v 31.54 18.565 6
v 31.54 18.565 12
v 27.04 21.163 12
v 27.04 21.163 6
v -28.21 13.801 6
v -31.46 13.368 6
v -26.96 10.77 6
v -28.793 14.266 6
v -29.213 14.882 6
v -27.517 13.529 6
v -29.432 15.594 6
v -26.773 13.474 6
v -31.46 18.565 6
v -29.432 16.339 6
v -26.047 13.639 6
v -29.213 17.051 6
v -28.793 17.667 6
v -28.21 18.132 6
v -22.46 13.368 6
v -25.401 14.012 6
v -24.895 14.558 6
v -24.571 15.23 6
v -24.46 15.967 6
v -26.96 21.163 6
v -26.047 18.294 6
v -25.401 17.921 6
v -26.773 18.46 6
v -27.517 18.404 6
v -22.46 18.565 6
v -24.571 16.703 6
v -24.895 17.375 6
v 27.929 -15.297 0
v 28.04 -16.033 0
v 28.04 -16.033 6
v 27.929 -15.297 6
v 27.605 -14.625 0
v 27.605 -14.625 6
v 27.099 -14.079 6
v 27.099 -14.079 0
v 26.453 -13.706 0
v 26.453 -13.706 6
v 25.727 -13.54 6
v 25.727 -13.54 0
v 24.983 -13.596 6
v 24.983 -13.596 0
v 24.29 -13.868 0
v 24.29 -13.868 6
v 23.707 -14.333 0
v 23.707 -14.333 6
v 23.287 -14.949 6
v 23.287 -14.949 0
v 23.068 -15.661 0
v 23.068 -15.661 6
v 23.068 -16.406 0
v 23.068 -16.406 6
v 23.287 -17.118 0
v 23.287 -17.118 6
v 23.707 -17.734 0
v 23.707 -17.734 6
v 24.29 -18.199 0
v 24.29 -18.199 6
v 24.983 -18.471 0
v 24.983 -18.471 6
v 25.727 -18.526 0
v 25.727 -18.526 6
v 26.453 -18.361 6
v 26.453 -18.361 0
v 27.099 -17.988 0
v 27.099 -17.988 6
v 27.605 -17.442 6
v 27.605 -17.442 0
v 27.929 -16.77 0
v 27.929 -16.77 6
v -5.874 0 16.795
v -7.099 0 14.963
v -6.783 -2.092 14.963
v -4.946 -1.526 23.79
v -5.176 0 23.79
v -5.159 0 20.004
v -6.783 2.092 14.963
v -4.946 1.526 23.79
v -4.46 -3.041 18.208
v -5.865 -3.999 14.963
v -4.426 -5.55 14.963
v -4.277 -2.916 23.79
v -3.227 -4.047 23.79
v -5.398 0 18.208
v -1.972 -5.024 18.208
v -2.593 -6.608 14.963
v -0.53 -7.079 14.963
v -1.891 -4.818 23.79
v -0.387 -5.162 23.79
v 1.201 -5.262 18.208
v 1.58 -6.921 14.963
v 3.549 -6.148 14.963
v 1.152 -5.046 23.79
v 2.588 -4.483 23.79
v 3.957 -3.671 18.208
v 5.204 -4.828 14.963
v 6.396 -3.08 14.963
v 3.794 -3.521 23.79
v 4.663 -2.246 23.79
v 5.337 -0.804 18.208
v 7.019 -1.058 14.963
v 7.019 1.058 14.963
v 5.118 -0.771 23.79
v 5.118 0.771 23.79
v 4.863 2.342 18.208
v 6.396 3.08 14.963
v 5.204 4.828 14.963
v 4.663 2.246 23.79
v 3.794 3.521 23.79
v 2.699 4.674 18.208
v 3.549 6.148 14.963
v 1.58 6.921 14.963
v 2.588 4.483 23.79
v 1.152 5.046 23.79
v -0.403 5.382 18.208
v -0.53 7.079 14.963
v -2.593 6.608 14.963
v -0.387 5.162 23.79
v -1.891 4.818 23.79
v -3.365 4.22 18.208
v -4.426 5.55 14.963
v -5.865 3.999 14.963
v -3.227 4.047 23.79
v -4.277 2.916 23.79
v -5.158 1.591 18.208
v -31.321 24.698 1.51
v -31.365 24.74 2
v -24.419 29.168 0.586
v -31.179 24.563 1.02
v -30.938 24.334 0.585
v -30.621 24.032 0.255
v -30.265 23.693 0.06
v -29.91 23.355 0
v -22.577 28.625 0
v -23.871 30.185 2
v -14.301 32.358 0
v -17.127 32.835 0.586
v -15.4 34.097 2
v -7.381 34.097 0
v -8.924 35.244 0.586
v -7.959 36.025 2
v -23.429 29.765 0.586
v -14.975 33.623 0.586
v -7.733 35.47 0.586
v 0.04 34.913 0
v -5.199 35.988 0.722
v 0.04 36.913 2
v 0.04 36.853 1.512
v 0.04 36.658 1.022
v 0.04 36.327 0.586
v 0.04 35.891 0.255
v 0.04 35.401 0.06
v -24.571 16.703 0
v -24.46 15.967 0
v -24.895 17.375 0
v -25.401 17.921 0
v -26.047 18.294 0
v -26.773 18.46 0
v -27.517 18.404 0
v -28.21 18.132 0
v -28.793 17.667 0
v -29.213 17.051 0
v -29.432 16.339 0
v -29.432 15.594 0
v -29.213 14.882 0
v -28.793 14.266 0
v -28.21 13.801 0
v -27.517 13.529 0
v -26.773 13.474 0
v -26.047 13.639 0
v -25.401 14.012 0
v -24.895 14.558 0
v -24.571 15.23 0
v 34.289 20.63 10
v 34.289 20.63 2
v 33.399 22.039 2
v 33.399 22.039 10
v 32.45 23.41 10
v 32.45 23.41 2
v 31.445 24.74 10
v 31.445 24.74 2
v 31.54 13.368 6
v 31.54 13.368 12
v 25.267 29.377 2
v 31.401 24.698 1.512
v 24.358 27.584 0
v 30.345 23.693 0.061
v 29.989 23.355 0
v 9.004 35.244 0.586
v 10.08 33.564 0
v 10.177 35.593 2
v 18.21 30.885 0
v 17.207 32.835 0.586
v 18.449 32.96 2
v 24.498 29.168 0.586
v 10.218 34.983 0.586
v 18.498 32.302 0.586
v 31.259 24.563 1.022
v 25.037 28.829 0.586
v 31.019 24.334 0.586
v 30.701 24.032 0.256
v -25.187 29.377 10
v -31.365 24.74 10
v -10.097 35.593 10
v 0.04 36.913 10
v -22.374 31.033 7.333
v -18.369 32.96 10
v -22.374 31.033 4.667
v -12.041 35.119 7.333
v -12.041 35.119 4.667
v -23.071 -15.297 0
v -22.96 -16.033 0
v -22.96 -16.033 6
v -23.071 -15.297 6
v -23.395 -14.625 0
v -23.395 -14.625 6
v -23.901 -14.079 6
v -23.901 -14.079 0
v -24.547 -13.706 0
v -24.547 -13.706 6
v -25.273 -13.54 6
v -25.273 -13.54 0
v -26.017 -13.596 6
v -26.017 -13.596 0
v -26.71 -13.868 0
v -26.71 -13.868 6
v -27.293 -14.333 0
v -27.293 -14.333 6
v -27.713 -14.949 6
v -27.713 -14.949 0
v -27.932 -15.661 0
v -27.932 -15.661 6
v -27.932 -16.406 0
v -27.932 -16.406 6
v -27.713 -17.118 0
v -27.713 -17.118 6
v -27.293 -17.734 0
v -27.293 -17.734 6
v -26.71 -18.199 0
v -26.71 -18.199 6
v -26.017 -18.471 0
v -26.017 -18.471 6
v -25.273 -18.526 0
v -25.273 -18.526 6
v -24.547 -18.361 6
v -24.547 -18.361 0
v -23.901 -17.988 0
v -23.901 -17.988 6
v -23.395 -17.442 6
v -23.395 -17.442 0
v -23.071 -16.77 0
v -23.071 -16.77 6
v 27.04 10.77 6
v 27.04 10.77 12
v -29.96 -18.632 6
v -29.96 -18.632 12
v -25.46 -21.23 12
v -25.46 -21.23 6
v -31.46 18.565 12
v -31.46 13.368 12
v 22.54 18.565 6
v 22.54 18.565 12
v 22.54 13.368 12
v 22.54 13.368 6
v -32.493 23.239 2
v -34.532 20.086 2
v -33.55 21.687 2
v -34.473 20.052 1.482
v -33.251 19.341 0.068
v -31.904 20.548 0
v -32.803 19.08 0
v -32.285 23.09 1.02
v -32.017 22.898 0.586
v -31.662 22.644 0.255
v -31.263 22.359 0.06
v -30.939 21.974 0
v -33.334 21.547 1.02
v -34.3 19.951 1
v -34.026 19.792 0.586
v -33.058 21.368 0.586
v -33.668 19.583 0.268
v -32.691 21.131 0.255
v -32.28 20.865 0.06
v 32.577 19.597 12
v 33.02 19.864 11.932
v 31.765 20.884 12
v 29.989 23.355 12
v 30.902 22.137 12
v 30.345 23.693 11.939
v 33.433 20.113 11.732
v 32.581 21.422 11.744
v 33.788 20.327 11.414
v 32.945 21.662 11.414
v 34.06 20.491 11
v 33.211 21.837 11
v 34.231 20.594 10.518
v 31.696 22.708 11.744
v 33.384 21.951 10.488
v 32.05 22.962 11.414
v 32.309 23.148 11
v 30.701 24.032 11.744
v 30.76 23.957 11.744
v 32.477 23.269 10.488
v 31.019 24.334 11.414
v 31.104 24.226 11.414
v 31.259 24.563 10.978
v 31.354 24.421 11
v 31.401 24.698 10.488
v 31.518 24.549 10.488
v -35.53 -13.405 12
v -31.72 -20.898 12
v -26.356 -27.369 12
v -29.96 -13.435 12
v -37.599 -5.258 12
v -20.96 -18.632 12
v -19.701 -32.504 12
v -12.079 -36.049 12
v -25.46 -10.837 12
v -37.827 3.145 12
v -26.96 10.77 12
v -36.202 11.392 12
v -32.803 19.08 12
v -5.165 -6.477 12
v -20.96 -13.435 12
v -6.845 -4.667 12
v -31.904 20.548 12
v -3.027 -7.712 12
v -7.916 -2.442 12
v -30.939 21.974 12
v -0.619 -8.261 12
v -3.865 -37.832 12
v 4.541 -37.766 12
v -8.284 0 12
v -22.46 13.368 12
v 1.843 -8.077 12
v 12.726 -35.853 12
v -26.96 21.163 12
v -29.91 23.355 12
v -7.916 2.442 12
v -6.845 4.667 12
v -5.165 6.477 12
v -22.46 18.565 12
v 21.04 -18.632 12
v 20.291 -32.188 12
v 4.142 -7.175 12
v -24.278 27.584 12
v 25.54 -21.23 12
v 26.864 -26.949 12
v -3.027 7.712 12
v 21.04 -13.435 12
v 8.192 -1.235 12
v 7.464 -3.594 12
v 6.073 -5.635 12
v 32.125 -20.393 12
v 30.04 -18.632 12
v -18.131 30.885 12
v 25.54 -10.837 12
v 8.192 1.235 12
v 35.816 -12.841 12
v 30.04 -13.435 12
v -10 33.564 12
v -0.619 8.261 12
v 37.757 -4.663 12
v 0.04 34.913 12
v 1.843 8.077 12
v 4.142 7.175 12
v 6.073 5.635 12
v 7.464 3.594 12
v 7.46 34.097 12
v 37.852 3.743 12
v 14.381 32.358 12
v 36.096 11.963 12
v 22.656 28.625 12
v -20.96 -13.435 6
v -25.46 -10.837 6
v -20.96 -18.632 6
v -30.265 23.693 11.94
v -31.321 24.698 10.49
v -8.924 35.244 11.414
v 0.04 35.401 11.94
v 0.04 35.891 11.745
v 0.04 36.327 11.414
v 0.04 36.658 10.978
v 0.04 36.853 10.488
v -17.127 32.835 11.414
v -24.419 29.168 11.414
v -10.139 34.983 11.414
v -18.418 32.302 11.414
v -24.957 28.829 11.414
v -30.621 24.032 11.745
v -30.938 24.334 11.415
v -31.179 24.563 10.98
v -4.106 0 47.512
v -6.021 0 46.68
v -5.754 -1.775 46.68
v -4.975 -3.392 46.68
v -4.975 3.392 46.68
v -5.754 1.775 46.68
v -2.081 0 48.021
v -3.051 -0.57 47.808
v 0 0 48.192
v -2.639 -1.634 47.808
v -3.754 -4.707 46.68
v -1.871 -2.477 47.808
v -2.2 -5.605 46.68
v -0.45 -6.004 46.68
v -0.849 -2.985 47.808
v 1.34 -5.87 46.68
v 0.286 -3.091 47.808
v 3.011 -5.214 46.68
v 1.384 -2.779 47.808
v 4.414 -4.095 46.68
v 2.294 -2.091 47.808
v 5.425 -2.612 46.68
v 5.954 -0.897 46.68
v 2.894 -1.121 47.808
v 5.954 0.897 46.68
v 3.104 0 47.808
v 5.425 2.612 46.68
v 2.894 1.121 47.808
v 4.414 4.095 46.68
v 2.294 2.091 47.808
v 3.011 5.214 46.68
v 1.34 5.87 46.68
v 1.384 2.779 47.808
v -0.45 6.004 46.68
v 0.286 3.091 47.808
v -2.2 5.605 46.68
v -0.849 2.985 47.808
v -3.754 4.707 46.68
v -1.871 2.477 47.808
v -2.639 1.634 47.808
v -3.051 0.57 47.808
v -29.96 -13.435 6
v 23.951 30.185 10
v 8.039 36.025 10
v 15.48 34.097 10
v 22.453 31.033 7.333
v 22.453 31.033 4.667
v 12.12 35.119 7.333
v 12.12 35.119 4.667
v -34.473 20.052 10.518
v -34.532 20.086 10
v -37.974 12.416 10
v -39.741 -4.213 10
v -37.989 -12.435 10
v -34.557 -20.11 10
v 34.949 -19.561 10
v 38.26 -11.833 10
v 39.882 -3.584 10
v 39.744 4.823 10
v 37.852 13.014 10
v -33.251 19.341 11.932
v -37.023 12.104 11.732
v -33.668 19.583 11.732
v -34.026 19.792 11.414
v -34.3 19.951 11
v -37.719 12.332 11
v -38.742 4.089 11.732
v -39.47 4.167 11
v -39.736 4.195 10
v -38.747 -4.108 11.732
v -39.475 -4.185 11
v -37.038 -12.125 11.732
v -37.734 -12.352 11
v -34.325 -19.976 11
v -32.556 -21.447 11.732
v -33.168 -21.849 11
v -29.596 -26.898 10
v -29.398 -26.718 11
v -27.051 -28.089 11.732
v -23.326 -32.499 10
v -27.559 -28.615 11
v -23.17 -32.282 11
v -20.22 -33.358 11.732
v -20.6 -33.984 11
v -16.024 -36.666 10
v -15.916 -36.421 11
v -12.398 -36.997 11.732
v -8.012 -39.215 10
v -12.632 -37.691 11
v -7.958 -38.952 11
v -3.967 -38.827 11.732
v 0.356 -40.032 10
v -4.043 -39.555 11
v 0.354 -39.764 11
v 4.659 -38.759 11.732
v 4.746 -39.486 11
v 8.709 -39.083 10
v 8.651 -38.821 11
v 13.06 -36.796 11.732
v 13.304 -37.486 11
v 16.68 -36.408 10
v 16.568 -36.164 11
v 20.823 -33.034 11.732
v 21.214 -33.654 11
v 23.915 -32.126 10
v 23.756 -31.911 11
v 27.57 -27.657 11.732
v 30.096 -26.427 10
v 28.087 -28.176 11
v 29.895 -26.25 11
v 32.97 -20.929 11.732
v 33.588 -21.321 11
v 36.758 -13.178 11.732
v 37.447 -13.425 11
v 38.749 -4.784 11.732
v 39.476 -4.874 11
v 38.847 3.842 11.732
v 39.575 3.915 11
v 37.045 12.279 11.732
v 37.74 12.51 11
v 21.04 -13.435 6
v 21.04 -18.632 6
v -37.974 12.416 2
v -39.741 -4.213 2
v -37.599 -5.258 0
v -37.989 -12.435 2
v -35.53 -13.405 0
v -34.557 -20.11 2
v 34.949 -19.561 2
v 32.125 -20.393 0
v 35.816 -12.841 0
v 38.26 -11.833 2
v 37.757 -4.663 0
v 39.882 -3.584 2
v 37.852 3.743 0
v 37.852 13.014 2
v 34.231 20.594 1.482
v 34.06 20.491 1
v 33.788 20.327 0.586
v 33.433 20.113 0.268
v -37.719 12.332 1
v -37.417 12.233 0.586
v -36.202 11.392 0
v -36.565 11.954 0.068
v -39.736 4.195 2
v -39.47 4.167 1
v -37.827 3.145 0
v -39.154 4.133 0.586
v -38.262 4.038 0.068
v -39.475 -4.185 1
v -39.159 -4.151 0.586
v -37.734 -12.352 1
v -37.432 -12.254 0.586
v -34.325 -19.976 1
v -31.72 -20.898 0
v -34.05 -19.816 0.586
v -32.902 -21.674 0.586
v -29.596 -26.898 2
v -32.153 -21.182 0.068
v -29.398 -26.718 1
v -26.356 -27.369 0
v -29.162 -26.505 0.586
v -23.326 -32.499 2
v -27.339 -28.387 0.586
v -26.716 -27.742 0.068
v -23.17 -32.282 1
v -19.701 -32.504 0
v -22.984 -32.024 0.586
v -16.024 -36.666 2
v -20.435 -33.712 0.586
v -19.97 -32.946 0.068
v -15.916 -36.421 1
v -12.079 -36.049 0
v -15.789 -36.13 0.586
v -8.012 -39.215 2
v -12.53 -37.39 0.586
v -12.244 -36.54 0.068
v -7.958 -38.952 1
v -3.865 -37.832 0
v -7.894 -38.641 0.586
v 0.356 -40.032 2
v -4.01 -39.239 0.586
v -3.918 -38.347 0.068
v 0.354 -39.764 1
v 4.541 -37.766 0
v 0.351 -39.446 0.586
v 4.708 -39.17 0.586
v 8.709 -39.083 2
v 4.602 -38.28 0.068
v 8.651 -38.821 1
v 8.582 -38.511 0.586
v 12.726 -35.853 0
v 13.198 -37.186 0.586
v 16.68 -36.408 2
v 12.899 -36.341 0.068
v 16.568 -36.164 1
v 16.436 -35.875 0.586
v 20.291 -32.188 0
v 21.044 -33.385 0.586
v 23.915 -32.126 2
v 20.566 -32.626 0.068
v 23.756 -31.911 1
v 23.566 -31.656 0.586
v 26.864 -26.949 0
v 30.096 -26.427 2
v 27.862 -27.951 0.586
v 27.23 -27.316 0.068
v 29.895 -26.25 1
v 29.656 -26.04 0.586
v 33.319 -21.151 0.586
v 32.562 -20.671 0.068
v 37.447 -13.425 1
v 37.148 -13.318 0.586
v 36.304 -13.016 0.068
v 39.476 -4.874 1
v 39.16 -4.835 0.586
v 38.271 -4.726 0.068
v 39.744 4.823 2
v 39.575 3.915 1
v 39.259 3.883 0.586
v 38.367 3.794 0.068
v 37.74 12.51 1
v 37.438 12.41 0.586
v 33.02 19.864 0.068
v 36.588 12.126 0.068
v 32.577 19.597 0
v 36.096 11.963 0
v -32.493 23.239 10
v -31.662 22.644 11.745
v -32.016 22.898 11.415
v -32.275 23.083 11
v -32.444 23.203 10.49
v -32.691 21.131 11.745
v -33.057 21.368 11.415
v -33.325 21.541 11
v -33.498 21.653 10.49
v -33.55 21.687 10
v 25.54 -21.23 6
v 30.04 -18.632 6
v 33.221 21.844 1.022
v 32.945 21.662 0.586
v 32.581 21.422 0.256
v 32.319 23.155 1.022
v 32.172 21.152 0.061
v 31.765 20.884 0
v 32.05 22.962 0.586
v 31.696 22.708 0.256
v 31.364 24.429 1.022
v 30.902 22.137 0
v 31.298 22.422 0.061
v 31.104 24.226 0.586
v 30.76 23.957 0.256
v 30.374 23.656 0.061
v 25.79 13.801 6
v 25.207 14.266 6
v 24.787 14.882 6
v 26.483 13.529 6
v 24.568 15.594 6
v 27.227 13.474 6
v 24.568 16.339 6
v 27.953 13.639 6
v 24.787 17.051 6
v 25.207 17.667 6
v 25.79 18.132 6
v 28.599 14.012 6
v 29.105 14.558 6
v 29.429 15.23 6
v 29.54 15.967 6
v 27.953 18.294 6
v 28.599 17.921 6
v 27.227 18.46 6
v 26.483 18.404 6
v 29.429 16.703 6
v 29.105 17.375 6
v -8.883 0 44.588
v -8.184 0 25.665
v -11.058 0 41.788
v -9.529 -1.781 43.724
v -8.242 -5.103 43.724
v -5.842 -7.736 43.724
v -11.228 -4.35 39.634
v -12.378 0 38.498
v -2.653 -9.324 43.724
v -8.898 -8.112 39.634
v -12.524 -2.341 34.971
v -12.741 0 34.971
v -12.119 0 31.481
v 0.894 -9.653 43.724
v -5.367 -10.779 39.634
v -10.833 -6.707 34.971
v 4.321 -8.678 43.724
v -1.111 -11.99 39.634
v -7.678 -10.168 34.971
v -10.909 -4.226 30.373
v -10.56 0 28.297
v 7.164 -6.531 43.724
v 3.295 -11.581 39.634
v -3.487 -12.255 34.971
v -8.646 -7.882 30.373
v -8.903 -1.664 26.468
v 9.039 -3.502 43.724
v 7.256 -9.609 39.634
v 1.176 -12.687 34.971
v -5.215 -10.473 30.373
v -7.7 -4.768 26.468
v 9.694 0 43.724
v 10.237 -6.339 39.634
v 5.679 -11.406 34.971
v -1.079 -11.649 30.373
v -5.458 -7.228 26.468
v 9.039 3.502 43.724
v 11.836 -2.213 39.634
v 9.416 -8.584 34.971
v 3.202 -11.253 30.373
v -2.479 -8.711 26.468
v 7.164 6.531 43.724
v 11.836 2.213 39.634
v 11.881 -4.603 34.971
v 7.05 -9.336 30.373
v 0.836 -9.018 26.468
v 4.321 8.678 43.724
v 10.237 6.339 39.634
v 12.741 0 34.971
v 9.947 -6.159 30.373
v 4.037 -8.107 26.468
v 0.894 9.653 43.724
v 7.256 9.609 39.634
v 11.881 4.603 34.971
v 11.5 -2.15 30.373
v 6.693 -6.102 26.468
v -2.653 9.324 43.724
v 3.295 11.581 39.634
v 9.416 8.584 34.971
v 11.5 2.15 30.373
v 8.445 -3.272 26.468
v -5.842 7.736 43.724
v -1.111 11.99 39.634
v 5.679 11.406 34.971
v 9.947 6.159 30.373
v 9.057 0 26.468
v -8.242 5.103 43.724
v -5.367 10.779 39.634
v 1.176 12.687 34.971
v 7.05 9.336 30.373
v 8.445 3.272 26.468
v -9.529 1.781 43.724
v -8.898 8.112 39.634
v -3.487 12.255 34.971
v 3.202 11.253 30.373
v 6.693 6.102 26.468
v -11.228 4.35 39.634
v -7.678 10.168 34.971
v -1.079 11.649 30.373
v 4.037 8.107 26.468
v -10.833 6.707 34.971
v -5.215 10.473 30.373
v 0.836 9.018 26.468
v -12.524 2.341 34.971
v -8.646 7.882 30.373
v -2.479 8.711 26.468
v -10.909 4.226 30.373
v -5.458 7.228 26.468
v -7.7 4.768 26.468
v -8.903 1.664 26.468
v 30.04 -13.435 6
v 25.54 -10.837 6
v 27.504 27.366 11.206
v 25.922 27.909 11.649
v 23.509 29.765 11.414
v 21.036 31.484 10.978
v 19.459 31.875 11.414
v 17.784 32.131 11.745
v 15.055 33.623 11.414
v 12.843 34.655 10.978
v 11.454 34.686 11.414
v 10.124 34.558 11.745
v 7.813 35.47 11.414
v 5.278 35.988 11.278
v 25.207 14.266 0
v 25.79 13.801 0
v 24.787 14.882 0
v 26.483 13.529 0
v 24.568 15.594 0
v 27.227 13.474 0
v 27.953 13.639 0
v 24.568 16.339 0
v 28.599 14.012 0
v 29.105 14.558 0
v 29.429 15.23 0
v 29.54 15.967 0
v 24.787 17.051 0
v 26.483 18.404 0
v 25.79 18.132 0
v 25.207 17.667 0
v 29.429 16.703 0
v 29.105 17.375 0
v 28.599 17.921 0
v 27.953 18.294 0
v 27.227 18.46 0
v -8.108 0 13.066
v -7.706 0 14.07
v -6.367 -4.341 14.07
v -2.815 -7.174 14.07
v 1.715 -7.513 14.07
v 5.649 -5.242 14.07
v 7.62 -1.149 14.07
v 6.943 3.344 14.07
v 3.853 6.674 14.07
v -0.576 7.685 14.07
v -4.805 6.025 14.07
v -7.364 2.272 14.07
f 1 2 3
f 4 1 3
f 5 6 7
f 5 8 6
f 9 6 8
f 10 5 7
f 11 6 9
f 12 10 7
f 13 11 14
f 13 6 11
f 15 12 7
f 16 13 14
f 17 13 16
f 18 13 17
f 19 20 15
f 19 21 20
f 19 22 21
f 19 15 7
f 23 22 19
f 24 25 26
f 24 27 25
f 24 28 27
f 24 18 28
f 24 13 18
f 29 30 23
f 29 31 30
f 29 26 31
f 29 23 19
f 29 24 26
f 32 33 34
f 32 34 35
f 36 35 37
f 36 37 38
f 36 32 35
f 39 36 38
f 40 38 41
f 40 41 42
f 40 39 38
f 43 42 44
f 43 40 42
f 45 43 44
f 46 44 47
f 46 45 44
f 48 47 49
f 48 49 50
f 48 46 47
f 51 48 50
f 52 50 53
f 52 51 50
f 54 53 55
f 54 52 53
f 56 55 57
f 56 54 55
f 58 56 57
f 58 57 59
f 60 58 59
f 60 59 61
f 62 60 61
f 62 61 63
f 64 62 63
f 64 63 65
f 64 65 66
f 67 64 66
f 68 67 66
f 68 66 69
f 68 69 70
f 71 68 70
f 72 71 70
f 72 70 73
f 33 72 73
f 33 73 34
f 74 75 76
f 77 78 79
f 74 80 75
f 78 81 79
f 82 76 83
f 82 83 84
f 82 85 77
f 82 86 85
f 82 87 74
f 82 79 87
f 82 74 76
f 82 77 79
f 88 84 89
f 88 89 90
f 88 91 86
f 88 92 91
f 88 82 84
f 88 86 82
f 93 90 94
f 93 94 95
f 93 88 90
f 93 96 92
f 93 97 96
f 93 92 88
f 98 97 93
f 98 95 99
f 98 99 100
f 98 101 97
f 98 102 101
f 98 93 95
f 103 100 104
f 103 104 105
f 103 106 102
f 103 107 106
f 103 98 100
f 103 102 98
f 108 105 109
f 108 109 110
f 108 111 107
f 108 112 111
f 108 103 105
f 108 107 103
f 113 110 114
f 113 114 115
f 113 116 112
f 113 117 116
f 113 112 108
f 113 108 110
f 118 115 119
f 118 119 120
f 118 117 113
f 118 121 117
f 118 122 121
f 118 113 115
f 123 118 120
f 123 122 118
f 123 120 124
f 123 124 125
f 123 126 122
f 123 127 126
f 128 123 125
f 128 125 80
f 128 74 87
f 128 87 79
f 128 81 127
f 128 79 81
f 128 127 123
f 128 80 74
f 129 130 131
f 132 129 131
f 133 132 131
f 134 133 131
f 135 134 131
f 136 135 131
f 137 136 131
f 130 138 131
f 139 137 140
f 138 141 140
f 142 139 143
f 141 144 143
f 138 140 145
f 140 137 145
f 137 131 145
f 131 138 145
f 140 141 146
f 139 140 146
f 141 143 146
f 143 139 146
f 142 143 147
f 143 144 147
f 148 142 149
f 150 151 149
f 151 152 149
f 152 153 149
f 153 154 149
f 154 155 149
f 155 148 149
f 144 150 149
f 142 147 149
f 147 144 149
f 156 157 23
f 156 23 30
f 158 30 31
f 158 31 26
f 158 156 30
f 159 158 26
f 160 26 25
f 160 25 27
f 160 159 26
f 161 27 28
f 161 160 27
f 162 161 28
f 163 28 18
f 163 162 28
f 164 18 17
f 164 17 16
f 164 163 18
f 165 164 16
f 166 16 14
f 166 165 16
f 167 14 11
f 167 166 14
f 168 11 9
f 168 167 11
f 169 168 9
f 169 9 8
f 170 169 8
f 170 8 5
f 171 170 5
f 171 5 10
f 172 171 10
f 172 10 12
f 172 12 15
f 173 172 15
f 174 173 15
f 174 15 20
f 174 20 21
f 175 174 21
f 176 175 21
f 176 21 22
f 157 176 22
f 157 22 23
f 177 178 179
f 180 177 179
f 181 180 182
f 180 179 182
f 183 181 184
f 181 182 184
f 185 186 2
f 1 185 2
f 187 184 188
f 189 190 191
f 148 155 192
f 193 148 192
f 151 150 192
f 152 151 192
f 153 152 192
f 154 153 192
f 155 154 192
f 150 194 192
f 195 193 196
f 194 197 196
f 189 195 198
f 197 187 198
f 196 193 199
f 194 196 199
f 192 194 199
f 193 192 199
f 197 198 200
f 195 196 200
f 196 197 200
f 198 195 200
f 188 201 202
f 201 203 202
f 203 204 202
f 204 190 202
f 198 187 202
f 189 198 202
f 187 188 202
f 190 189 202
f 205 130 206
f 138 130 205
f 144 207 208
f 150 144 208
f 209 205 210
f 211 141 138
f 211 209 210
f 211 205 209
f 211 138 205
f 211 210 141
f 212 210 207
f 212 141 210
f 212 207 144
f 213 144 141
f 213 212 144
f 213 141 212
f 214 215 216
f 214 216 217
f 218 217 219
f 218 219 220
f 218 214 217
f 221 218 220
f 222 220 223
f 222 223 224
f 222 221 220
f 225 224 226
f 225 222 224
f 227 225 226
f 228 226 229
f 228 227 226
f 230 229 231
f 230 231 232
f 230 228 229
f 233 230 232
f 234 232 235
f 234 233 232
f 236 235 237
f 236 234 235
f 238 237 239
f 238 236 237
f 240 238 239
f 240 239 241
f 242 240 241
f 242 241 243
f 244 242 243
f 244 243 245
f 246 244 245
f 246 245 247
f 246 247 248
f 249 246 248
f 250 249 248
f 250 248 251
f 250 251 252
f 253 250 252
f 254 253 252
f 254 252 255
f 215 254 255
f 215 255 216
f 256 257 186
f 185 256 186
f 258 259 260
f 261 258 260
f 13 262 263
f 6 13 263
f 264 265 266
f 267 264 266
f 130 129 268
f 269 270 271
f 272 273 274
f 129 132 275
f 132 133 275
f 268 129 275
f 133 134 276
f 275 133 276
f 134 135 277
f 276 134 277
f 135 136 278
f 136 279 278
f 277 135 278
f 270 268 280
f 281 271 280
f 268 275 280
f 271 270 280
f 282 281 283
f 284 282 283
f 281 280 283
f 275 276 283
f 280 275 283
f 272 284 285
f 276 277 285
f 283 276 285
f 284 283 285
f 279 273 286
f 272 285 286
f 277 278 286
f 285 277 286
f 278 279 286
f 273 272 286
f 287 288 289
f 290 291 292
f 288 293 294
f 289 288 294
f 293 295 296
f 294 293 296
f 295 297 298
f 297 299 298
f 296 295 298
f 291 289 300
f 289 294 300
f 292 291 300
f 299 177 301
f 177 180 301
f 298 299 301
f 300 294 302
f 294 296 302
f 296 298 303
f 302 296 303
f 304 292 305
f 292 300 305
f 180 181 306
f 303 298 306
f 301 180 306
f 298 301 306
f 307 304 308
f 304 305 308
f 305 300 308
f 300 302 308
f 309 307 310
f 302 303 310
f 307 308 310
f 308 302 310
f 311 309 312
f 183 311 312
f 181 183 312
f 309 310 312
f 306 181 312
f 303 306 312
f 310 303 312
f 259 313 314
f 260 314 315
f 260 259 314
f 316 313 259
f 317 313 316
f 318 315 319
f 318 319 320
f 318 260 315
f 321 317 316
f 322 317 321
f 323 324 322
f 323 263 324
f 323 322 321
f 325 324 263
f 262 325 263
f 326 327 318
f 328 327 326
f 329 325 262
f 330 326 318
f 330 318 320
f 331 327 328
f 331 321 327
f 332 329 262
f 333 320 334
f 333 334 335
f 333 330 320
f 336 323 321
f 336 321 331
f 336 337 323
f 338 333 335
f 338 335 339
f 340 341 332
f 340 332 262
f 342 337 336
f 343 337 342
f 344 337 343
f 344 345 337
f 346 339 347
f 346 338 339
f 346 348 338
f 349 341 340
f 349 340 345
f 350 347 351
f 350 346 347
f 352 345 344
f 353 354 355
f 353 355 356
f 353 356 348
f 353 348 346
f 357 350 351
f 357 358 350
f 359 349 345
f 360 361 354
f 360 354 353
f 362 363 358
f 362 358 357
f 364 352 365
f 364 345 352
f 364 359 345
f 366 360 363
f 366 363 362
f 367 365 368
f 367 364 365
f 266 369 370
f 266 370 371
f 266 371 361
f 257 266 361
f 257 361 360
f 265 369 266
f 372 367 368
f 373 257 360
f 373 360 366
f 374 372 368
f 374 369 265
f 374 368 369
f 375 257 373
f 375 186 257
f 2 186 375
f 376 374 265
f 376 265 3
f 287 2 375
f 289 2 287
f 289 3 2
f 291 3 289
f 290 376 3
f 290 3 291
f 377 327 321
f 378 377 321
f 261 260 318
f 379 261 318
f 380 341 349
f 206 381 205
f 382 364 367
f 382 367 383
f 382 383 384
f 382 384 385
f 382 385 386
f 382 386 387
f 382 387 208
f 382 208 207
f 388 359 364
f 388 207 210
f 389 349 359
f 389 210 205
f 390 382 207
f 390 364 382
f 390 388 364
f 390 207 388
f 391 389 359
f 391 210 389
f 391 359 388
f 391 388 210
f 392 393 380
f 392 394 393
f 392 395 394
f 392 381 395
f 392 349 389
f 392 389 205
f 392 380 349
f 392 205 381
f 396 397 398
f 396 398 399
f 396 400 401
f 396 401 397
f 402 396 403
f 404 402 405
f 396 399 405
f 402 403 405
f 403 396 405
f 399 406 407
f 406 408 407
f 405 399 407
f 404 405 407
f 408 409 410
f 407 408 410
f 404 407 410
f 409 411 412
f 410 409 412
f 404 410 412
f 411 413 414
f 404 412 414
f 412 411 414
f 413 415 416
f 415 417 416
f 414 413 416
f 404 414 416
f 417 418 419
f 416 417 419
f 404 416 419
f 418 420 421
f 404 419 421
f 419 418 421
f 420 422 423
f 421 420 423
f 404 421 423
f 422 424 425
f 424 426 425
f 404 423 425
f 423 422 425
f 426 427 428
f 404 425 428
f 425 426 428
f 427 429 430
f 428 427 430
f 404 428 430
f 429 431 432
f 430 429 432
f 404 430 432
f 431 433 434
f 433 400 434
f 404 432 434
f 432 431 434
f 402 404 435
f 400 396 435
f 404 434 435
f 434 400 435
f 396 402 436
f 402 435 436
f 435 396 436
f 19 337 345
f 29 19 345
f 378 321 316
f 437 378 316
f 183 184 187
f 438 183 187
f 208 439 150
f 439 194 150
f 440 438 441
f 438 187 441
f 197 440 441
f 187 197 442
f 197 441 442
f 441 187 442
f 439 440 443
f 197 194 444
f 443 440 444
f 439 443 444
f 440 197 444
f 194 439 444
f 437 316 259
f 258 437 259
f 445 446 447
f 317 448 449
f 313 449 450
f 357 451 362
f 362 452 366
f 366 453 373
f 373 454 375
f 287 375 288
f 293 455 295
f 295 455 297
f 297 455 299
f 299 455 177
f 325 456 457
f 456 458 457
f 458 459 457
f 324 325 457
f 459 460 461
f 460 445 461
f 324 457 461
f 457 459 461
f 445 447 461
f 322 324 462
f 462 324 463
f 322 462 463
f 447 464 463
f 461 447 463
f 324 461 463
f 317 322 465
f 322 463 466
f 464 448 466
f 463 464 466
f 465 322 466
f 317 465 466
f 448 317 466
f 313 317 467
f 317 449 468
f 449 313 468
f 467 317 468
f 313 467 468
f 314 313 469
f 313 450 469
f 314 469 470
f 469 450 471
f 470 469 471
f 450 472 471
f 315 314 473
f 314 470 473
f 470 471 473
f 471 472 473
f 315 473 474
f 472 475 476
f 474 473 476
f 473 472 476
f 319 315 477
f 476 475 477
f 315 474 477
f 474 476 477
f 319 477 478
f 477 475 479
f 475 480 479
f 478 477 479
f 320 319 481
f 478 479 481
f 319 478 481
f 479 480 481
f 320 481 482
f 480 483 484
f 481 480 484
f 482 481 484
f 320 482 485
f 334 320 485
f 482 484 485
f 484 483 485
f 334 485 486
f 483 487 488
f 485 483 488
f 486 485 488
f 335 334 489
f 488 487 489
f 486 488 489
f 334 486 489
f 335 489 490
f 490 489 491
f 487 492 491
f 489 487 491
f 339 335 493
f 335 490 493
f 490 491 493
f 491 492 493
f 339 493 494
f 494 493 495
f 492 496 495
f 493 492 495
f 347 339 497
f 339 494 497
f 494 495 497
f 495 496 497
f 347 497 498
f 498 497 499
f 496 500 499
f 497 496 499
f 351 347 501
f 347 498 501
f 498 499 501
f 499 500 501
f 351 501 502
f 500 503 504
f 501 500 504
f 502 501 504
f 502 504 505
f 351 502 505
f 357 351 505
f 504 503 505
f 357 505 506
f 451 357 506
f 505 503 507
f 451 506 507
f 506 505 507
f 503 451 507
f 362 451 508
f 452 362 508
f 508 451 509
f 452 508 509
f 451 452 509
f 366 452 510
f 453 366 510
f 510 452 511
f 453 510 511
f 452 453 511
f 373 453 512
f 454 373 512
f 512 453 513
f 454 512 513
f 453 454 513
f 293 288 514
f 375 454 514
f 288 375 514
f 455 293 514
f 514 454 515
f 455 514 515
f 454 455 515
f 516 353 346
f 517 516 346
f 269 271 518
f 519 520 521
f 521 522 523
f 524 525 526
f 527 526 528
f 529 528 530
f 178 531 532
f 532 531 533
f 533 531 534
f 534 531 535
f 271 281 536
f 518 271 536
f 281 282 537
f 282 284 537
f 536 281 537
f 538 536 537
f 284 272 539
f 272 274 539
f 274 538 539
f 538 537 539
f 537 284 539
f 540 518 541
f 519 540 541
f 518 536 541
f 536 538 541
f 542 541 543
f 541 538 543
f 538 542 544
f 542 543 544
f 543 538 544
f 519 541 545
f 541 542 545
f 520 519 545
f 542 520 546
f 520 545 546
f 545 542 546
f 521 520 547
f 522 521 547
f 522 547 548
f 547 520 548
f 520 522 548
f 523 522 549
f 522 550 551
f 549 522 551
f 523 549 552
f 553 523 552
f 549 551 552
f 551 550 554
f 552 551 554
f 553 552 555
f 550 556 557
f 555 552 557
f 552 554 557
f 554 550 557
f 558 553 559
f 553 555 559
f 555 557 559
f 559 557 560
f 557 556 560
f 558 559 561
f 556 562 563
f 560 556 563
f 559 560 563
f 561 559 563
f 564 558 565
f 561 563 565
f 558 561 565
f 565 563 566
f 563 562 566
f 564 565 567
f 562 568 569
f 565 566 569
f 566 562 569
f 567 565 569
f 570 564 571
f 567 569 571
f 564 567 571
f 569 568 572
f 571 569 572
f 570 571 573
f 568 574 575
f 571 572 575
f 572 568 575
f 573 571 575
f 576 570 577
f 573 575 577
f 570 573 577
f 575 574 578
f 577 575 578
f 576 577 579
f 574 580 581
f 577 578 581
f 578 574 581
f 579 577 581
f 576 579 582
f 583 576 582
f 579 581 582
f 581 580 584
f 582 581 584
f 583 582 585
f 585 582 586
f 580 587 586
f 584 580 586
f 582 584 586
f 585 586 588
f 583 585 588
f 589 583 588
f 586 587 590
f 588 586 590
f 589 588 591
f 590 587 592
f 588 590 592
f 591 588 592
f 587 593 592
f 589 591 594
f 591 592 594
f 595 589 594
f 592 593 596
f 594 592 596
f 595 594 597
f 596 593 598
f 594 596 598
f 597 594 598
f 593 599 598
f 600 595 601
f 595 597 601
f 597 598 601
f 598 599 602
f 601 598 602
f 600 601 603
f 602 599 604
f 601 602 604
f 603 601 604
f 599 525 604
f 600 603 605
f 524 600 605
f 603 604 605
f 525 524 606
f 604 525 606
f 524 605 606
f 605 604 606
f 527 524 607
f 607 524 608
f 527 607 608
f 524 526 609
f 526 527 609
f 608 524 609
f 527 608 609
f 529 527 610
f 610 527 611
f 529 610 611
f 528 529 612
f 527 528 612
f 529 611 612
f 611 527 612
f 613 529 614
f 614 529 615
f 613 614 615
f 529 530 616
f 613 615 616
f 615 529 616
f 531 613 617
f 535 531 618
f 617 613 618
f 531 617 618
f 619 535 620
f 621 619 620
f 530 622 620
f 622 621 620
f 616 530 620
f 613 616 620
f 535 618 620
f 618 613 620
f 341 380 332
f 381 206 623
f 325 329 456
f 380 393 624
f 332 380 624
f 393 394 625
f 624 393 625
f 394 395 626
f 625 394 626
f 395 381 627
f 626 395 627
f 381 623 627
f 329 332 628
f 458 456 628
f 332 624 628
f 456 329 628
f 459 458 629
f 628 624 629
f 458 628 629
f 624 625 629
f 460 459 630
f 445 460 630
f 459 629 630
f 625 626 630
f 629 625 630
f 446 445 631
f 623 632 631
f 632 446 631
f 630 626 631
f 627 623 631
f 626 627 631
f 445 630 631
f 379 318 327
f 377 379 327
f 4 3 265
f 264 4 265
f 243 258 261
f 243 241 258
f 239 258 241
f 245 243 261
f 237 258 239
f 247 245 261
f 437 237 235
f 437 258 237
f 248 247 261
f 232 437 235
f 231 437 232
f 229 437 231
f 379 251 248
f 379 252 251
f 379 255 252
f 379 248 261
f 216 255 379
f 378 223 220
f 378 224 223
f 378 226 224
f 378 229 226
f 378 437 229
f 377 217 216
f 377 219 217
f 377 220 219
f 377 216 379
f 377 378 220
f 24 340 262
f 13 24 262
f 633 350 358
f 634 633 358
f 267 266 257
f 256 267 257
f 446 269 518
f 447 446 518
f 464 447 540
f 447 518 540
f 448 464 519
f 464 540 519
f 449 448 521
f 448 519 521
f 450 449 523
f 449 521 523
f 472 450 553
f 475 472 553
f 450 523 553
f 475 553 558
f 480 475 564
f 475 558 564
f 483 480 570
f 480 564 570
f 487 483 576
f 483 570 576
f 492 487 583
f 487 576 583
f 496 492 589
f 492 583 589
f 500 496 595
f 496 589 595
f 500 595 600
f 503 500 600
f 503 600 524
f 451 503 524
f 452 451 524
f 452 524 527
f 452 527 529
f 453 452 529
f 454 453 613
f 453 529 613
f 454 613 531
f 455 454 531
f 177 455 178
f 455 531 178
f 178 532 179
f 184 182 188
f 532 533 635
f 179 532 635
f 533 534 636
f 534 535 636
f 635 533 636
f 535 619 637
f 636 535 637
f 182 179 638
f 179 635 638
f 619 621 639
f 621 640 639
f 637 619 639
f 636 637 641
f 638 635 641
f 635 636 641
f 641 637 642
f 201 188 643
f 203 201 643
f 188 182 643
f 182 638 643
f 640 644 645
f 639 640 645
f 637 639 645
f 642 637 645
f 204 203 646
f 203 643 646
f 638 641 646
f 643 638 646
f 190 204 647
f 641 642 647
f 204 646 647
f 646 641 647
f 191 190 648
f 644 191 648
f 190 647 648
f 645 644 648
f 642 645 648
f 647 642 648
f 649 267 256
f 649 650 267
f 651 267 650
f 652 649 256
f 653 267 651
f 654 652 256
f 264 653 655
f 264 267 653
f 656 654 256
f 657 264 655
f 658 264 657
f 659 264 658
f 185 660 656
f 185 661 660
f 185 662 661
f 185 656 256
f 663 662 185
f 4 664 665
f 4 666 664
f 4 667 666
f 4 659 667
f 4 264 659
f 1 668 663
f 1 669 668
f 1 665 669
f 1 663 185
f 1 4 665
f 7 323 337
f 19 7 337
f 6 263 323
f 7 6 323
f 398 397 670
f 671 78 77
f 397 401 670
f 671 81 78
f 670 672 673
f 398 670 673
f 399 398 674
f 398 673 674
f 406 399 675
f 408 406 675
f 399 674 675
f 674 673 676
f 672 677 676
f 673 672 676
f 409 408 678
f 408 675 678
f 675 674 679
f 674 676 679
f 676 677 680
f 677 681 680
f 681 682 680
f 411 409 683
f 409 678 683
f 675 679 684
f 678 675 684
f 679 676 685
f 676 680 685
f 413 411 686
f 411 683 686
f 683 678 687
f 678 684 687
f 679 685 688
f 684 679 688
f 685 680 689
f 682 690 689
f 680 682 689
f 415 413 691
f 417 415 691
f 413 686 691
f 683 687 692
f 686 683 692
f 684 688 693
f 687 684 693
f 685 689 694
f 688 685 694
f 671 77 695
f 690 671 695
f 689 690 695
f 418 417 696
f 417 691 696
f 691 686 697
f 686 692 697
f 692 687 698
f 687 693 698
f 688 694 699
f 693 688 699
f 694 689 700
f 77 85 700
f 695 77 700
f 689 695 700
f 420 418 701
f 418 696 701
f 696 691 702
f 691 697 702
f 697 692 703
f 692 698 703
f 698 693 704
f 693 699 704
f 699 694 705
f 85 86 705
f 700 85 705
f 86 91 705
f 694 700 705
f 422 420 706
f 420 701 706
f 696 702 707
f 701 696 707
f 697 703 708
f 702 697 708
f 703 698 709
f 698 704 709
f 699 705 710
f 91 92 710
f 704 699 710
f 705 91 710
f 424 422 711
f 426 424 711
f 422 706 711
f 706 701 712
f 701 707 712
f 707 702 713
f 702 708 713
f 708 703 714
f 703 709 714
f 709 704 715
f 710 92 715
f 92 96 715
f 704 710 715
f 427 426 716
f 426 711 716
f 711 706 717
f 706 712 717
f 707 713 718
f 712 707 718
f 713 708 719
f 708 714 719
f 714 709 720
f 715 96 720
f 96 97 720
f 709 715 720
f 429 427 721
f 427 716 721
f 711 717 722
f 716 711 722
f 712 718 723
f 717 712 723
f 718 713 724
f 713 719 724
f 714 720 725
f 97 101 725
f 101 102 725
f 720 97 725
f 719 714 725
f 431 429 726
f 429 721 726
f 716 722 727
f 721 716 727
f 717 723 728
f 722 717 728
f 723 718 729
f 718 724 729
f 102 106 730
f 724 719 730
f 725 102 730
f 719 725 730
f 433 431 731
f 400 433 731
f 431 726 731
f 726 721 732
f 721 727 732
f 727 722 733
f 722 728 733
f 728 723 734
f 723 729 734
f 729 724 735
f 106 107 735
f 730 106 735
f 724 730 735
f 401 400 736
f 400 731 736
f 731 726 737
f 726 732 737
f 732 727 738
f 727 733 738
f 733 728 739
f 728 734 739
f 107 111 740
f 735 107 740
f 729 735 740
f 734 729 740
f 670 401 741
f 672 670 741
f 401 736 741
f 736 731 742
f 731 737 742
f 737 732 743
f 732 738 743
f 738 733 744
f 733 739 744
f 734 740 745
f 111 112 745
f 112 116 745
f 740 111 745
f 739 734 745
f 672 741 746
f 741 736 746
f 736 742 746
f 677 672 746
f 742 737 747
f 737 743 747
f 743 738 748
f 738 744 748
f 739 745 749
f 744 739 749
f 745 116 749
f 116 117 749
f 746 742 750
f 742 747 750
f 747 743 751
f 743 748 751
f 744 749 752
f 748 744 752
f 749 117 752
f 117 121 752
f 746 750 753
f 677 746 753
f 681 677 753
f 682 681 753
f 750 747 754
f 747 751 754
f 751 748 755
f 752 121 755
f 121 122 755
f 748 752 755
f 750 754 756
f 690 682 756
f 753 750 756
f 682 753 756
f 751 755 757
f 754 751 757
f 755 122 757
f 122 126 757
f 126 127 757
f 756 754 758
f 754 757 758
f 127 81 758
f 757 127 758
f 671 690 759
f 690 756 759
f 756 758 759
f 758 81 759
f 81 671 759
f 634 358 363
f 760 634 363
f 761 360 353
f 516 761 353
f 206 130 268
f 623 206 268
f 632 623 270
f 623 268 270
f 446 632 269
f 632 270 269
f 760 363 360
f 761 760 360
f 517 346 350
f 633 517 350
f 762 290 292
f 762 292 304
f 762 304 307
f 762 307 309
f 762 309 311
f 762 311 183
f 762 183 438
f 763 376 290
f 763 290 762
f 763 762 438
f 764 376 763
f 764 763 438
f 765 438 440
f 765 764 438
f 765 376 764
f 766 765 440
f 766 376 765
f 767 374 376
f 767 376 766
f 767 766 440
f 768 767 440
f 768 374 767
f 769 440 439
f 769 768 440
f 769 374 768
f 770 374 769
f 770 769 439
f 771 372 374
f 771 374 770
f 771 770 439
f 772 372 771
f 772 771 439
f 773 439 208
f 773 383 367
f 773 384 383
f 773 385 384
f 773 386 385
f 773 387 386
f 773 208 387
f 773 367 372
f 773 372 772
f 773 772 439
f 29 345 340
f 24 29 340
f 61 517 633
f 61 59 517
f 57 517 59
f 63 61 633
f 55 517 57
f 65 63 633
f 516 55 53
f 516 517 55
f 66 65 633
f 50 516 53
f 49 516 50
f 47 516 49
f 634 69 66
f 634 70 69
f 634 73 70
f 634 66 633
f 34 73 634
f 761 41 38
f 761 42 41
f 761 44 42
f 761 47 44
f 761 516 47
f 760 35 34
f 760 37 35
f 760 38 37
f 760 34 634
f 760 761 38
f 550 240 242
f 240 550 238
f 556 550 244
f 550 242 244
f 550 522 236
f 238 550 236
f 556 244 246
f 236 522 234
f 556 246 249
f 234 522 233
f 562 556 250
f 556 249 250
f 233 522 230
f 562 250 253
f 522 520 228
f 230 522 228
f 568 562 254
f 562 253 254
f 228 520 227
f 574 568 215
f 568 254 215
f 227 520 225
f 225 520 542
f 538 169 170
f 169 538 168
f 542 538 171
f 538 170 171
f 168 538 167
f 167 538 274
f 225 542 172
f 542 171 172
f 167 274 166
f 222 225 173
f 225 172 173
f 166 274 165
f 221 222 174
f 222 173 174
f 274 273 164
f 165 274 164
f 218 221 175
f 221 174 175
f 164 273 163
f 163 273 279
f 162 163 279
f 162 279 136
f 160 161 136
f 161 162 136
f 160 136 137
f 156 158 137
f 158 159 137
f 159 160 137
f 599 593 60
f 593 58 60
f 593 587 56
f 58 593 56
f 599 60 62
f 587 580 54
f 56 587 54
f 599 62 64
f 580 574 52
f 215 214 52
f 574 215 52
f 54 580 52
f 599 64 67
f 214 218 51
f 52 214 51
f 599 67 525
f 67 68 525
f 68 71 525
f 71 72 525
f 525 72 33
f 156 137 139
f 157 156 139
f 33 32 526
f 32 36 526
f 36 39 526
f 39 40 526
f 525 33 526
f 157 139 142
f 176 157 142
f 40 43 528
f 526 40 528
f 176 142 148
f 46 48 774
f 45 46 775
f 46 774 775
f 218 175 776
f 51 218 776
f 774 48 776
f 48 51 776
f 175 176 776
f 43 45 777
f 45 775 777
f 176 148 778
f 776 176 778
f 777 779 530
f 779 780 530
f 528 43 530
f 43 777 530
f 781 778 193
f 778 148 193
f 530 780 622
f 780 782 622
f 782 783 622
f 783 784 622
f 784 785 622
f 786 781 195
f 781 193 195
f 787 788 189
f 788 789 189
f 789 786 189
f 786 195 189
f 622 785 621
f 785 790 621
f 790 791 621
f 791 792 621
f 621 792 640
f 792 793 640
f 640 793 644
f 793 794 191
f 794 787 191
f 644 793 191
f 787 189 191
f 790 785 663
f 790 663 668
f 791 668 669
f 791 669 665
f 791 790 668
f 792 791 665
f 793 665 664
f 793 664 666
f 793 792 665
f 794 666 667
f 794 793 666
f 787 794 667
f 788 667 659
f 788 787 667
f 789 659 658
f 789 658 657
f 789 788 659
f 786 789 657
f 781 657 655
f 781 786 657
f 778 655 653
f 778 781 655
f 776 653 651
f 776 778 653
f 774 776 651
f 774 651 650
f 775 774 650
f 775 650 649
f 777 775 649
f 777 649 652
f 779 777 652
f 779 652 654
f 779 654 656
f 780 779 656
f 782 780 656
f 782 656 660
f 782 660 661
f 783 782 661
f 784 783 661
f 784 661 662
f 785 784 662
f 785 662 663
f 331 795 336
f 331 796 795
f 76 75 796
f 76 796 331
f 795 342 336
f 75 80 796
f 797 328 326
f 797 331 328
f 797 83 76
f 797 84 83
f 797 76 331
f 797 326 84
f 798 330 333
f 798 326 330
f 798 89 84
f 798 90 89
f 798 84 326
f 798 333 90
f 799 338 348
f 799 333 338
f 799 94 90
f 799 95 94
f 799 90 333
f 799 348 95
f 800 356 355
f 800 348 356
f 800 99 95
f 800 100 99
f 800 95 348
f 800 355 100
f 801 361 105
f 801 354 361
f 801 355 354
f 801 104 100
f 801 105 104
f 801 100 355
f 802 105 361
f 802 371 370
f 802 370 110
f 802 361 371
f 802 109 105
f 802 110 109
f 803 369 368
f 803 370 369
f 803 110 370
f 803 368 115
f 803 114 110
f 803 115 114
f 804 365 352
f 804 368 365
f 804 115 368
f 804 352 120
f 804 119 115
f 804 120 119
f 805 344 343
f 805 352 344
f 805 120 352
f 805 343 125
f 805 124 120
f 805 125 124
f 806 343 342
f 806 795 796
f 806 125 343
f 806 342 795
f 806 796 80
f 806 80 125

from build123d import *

# Parameters (mm, degrees)
F0_R     = 2.5
F1_DEPTH = 12
F3_R     = 2.5
F4_DEPTH = 6
F8_R     = 2


# Not quite as in the source:
# - a fillet or chamfer that OpenCascade refuses, or shapes differently, is made with other operations: its cross-section is extruded or revolved along the edge and cut away or added


with BuildPart() as f1:
    # F0 (on Top) → F1 (new body)
    with BuildSketch(Plane.XY):
        with BuildLine():
            ThreePointArc((-31.3651592039, 24.7400687451), (-33.0304528025, 22.4689333996), (-34.5318159842, 20.0862527403))
            ThreePointArc((-34.5318159842, 20.0862527403), (0.3556410553, -40.0322385106), (34.289361103, 20.6296959515))
            ThreePointArc((34.289361103, 20.6296959515), (32.9313235996, 22.7293613836), (31.4447447441, 24.7400687451))
            add(Edge.make_bspline(
                [(31.4447447441, 24.7400687451), (22.988602022, 32.1085255021), (13.1297165658, 36.2919575894), (0.0397927701, 36.9132596428)],
                knots=[0, 0, 0, 0, 0.5, 0.5, 0.5, 0.5], degree=3))
            add(Edge.make_bspline(
                [(-31.3651592039, 24.7400687451), (-22.9090164817, 32.1085255021), (-13.0501310255, 36.2919575894), (0.0397927701, 36.9132596428)],
                knots=[0, 0, 0, 0, 0.5, 0.5, 0.5, 0.5], degree=3))
        make_face()
        with Locations((-25.4602072299, -16.0334855318)):
            Circle(F0_R, mode=Mode.SUBTRACT)
        with Locations((25.5397927701, -16.0334855318)):
            Circle(F0_R, mode=Mode.SUBTRACT)
        with Locations((-26.9602072299, 15.9665144682)):
            Circle(F0_R, mode=Mode.SUBTRACT)
        with Locations((27.0397927701, 15.9665144682)):
            Circle(F0_R, mode=Mode.SUBTRACT)
    extrude(amount=F1_DEPTH)

    # F3 (on face) → F4 (cut)
    with BuildSketch(Plane.XY.offset(12)):
        Polygon((-22.4602072299, 13.3684382568), (-22.4602072299, 18.5645906795), (-26.9602072299, 21.1626668909), (-31.4602072299, 18.5645906795), (-31.4602072299, 13.3684382568), (-26.9602072299, 10.7703620455), align=None)
        with Locations((-26.9602072299, 15.9665144682)):
            Circle(F3_R, mode=Mode.SUBTRACT)
        Polygon((22.5397927701, 18.5645906795), (22.5397927701, 13.3684382568), (27.0397927701, 10.7703620455), (31.5397927701, 13.3684382568), (31.5397927701, 18.5645906795), (27.0397927701, 21.1626668909), align=None)
        with Locations((27.0397927701, 15.9665144682)):
            Circle(F3_R, mode=Mode.SUBTRACT)
        Polygon((21.0397927701, -13.4354093205), (21.0397927701, -18.6315617432), (25.5397927701, -21.2296379545), (30.0397927701, -18.6315617432), (30.0397927701, -13.4354093205), (25.5397927701, -10.8373331091), align=None)
        with Locations((25.5397927701, -16.0334855318)):
            Circle(F3_R, mode=Mode.SUBTRACT)
        Polygon((-20.9602072299, -18.6315617432), (-20.9602072299, -13.4354093205), (-25.4602072299, -10.8373331091), (-29.9602072299, -13.4354093205), (-29.9602072299, -18.6315617432), (-25.4602072299, -21.2296379545), align=None)
        with Locations((-25.4602072299, -16.0334855318)):
            Circle(F3_R, mode=Mode.SUBTRACT)
    extrude(amount=-F4_DEPTH, mode=Mode.SUBTRACT)

    # F5 (on Front) → F6 (revolve)
    with BuildSketch(Plane.XZ):
        with BuildLine():
            Line((-8.284470181, 11.8907699668), (0, 11.8907699668))
            Line((0, 11.8907699668), (0, 48.1916638966))
            ThreePointArc((0, 48.1916638966), (-3.1039423325, 47.8080717015), (-6.0211163429, 46.6803763667))
            ThreePointArc((-6.0211163429, 46.6803763667), (-12.7413209188, 34.9713010104), (-5.1760724611, 23.7895922406))
            add(Edge.make_bspline(
                [(-8.284470181, 13.6864552548), (-7.2384952575, 14.7658121918), (-4.9346184441, 17.14342214), (-5.0921300249, 21.4398414936), (-5.1760724611, 23.7895922406)],
                knots=[0, 0, 0, 0, 0.4540341601, 1, 1, 1, 1], degree=3))
            Line((-8.284470181, 13.6864552548), (-8.284470181, 11.8907699668))
        make_face()
    revolve(axis=Axis((0, 0, 50.5361706018), (0, 0, 1)))

    # F7: fillet of radius 5 on 1 edges, made by hand

    # F7_s1 → F7_t2 (revolve, cut)
    with BuildSketch(Plane.XZ):
        with BuildLine():
            ThreePointArc((-8.284470181, 12), (-7.9344186734, 13.5789038819), (-7.0987068449, 14.9634829753))
            Line((-7.0987068449, 14.9634829753), (-7.1748362782, 15.0283236215))
            ThreePointArc((-7.1748362782, 15.0283236215), (-7.7543234481, 14.3838527889), (-8.3562826351, 13.7560467158))
            Line((-8.3562826351, 13.7560467158), (-8.384470181, 13.6864552548))
            ThreePointArc((-8.384470181, 13.6864552548), (-8.384470181, 12.8432276274), (-8.384314881, 12.0055709867))
            Line((-8.384314881, 12.0055709867), (-8.284470181, 12))
        make_face()
    revolve(axis=Axis((0, 0, 13.6864552548), (0, 0, 1)), mode=Mode.SUBTRACT)

    # F8
    f8_edges = [f1.edges().sort_by_distance(p)[0] for p in [
        (-2.459557, -39.955325, 12),
        (-2.459557, -39.955325, 0),
        (16.831403, 33.608309, 12),
        (-16.751817, 33.608309, 12),
        (-16.751817, 33.608309, 0),
        (16.831403, 33.608309, 0),
    ]]
    fillet(f8_edges, radius=F8_R)


solid = f1.part
